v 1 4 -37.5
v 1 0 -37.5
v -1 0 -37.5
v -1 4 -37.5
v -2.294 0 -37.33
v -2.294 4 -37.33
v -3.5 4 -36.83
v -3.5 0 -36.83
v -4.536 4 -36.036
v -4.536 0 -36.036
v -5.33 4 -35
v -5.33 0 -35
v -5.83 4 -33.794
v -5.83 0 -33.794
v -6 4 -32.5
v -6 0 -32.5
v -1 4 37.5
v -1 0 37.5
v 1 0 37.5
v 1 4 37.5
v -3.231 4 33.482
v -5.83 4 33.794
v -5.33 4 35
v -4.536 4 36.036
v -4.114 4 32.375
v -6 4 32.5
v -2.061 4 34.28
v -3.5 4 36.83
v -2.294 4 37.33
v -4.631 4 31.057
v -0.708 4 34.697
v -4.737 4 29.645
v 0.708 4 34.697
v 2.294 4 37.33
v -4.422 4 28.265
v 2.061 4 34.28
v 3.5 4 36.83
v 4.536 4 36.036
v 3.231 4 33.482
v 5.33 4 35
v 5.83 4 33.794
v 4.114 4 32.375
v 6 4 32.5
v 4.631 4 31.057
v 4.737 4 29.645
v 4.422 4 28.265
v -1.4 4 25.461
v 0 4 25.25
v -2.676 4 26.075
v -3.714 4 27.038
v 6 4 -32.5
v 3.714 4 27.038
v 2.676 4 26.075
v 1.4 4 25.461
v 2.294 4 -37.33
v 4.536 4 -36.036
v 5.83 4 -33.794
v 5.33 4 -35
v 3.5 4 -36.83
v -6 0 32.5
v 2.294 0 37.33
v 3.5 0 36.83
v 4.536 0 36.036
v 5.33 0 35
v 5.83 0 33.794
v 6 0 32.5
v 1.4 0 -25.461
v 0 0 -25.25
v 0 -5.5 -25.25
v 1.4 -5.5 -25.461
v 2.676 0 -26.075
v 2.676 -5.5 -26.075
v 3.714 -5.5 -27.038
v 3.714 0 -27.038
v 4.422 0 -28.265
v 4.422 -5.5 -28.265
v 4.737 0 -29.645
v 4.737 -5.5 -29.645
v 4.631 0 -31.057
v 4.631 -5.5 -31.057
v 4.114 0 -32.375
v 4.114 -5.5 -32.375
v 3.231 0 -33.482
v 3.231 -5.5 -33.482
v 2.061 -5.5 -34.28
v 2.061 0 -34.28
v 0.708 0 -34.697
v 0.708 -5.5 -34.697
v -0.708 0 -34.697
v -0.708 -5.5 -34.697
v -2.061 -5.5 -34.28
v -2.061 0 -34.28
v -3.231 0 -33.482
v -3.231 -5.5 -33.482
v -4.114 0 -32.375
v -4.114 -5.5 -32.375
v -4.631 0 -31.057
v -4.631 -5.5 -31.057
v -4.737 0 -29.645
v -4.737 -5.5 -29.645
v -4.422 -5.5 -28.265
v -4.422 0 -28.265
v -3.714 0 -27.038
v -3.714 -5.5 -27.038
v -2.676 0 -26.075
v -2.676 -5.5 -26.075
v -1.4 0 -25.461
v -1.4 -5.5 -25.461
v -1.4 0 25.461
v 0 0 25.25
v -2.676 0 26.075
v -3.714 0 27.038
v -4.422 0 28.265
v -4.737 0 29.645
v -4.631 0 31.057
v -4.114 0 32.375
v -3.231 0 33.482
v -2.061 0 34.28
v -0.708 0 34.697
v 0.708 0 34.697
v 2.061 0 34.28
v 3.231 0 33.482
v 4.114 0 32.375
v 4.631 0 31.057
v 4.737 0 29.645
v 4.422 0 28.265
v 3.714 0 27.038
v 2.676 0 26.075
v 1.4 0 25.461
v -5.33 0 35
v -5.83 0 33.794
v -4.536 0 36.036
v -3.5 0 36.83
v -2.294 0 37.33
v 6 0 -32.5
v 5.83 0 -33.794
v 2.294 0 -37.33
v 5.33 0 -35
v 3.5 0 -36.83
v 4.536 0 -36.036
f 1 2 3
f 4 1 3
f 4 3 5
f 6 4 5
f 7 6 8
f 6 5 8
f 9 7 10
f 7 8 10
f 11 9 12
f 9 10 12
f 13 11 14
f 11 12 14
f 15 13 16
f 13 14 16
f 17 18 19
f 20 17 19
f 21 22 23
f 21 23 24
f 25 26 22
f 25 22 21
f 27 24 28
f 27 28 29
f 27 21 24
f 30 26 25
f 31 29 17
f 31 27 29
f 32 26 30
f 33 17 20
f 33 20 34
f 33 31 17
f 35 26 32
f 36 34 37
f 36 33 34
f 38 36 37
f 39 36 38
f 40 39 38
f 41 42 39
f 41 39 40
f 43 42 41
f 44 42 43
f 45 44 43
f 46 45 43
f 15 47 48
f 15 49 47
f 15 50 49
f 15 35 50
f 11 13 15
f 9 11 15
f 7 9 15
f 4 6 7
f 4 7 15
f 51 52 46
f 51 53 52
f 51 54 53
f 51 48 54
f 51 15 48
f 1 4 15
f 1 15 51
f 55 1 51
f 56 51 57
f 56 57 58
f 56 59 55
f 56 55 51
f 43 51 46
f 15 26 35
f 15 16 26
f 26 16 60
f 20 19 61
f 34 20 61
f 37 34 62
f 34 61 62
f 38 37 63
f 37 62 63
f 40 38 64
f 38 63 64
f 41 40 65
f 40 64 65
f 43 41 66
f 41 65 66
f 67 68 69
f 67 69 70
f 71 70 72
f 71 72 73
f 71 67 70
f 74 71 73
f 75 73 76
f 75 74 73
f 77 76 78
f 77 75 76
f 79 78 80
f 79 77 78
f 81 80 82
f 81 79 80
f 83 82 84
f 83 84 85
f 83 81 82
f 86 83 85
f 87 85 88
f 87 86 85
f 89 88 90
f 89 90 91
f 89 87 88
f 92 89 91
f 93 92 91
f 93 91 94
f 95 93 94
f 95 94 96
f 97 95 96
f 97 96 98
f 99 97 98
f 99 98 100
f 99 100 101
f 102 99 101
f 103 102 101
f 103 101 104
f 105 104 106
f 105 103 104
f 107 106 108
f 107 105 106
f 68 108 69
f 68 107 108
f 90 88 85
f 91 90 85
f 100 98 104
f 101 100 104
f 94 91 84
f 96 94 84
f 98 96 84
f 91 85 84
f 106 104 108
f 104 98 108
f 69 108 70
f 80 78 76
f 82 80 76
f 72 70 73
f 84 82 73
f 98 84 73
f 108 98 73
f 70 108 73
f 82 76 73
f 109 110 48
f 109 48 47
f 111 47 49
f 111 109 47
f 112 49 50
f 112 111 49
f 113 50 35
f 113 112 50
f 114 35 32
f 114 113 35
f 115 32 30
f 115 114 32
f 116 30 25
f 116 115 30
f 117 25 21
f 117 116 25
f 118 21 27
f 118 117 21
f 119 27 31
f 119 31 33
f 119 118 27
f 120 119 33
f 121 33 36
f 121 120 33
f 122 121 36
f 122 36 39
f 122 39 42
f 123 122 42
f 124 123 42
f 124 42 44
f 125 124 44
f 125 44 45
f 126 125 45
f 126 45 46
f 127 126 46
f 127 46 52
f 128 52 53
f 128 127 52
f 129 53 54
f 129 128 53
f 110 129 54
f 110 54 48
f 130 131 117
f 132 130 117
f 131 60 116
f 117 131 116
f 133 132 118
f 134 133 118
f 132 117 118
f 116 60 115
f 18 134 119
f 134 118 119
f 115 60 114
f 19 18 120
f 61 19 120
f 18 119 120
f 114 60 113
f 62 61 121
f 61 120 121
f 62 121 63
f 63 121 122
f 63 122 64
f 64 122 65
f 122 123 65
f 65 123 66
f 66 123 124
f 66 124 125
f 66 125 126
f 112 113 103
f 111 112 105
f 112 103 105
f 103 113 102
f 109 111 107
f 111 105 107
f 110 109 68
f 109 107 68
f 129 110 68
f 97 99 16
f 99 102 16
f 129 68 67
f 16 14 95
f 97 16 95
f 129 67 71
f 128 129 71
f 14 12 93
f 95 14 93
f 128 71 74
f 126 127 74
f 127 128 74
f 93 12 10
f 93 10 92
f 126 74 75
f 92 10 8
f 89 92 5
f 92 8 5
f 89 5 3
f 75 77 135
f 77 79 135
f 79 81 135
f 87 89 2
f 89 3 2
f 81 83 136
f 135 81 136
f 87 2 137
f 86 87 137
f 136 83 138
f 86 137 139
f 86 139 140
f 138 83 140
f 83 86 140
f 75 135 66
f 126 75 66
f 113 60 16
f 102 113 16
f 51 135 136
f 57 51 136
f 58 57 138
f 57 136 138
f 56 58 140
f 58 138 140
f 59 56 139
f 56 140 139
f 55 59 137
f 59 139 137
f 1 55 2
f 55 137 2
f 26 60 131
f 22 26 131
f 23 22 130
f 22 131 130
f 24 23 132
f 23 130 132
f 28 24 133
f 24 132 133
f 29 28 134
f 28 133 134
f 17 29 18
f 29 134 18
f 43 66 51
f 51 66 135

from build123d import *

# Parameters (mm, degrees)
BOSS_EXTRUDE1_DEPTH = 4
SKETCH2_4_R         = 4.75
BOSS_EXTRUDE2_DEPTH = 5.5
SKETCH2_5_R         = 4.75
CUT_EXTRUDE1_DEPTH  = 4


with BuildPart() as part:
    # Sketch2 → Boss-Extrude1 (new body)
    with BuildSketch(Plane(origin=(0, 0, 0), x_dir=(1, 0, 0), z_dir=(0, 1, 0))):
        with BuildLine():
            Line((-1, -37.5), (1, -37.5))
            ThreePointArc((1, -37.5), (4.535533906, -36.035533906), (6, -32.5))
            Line((6, -32.5), (6, 32.5))
            ThreePointArc((6, 32.5), (4.535533906, 36.035533906), (1, 37.5))
            Line((1, 37.5), (-1, 37.5))
            ThreePointArc((-1, 37.5), (-4.535533906, 36.035533906), (-6, 32.5))
            Line((-6, 32.5), (-6, -32.5))
            ThreePointArc((-6, -32.5), (-4.535533906, -36.035533906), (-1, -37.5))
        make_face()
    extrude(amount=BOSS_EXTRUDE1_DEPTH)

    # Sketch2<4> → Boss-Extrude2 (add)
    with BuildSketch(Plane(origin=(0, 0, 0), x_dir=(1, 0, 0), z_dir=(0, 1, 0))):
        with Locations(Location((0, 30, 0), (0, 0, 270))):
            Circle(SKETCH2_4_R)
    extrude(amount=-BOSS_EXTRUDE2_DEPTH)

    # Sketch2<5> → Cut-Extrude1 (cut)
    with BuildSketch(Plane(origin=(0, 0, 0), x_dir=(1, 0, 0), z_dir=(0, 1, 0))):
        with Locations(Location((0, -30, 0), (0, 0, 90))):
            Circle(SKETCH2_5_R)
    extrude(amount=CUT_EXTRUDE1_DEPTH, mode=Mode.SUBTRACT)


solid = part.part
